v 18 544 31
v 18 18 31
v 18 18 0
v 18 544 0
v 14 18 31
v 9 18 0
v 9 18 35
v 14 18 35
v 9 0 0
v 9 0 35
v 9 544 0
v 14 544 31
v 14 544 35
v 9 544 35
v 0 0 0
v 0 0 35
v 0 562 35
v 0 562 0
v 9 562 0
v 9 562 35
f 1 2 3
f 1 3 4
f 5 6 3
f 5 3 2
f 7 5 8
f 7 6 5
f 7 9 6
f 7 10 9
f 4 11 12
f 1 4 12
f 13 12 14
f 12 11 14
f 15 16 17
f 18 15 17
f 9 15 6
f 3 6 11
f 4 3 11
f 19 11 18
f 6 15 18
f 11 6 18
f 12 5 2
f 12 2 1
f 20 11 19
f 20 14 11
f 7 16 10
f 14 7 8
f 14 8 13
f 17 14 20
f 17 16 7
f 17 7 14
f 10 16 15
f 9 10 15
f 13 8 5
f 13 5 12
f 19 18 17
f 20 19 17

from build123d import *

# Parameters (mm, degrees)
F0_W     = 526
F0_H     = 31
F1_DEPTH = 18
F0_W_2   = 18
F0_H_2   = 4
F2_DEPTH = 9
F3_DEPTH = 14


with BuildPart() as f1:
    # F0 (on Right) → F1 (new body)
    with BuildSketch(Plane.YZ):
        with Locations((281, 15.5)):
            Rectangle(F0_W, F0_H)
    extrude(amount=F1_DEPTH)

    # F0 (on Right) → F2 (join)
    with BuildSketch(Plane.YZ):
        with Locations((9, 15.5)):
            Rectangle(F0_W_2, F0_H)
        with Locations((553, 15.5)):
            Rectangle(F0_W_2, F0_H)
        with Locations((9, 33)):
            Rectangle(F0_W_2, F0_H_2)
        with Locations((553, 33)):
            Rectangle(F0_W_2, F0_H_2)
    extrude(amount=F2_DEPTH)

    # F0 (on Right) → F3 (join)
    with BuildSketch(Plane.YZ):
        with Locations((281, 33)):
            Rectangle(F0_W, F0_H_2)
    extrude(amount=F3_DEPTH)


solid = f1.part
